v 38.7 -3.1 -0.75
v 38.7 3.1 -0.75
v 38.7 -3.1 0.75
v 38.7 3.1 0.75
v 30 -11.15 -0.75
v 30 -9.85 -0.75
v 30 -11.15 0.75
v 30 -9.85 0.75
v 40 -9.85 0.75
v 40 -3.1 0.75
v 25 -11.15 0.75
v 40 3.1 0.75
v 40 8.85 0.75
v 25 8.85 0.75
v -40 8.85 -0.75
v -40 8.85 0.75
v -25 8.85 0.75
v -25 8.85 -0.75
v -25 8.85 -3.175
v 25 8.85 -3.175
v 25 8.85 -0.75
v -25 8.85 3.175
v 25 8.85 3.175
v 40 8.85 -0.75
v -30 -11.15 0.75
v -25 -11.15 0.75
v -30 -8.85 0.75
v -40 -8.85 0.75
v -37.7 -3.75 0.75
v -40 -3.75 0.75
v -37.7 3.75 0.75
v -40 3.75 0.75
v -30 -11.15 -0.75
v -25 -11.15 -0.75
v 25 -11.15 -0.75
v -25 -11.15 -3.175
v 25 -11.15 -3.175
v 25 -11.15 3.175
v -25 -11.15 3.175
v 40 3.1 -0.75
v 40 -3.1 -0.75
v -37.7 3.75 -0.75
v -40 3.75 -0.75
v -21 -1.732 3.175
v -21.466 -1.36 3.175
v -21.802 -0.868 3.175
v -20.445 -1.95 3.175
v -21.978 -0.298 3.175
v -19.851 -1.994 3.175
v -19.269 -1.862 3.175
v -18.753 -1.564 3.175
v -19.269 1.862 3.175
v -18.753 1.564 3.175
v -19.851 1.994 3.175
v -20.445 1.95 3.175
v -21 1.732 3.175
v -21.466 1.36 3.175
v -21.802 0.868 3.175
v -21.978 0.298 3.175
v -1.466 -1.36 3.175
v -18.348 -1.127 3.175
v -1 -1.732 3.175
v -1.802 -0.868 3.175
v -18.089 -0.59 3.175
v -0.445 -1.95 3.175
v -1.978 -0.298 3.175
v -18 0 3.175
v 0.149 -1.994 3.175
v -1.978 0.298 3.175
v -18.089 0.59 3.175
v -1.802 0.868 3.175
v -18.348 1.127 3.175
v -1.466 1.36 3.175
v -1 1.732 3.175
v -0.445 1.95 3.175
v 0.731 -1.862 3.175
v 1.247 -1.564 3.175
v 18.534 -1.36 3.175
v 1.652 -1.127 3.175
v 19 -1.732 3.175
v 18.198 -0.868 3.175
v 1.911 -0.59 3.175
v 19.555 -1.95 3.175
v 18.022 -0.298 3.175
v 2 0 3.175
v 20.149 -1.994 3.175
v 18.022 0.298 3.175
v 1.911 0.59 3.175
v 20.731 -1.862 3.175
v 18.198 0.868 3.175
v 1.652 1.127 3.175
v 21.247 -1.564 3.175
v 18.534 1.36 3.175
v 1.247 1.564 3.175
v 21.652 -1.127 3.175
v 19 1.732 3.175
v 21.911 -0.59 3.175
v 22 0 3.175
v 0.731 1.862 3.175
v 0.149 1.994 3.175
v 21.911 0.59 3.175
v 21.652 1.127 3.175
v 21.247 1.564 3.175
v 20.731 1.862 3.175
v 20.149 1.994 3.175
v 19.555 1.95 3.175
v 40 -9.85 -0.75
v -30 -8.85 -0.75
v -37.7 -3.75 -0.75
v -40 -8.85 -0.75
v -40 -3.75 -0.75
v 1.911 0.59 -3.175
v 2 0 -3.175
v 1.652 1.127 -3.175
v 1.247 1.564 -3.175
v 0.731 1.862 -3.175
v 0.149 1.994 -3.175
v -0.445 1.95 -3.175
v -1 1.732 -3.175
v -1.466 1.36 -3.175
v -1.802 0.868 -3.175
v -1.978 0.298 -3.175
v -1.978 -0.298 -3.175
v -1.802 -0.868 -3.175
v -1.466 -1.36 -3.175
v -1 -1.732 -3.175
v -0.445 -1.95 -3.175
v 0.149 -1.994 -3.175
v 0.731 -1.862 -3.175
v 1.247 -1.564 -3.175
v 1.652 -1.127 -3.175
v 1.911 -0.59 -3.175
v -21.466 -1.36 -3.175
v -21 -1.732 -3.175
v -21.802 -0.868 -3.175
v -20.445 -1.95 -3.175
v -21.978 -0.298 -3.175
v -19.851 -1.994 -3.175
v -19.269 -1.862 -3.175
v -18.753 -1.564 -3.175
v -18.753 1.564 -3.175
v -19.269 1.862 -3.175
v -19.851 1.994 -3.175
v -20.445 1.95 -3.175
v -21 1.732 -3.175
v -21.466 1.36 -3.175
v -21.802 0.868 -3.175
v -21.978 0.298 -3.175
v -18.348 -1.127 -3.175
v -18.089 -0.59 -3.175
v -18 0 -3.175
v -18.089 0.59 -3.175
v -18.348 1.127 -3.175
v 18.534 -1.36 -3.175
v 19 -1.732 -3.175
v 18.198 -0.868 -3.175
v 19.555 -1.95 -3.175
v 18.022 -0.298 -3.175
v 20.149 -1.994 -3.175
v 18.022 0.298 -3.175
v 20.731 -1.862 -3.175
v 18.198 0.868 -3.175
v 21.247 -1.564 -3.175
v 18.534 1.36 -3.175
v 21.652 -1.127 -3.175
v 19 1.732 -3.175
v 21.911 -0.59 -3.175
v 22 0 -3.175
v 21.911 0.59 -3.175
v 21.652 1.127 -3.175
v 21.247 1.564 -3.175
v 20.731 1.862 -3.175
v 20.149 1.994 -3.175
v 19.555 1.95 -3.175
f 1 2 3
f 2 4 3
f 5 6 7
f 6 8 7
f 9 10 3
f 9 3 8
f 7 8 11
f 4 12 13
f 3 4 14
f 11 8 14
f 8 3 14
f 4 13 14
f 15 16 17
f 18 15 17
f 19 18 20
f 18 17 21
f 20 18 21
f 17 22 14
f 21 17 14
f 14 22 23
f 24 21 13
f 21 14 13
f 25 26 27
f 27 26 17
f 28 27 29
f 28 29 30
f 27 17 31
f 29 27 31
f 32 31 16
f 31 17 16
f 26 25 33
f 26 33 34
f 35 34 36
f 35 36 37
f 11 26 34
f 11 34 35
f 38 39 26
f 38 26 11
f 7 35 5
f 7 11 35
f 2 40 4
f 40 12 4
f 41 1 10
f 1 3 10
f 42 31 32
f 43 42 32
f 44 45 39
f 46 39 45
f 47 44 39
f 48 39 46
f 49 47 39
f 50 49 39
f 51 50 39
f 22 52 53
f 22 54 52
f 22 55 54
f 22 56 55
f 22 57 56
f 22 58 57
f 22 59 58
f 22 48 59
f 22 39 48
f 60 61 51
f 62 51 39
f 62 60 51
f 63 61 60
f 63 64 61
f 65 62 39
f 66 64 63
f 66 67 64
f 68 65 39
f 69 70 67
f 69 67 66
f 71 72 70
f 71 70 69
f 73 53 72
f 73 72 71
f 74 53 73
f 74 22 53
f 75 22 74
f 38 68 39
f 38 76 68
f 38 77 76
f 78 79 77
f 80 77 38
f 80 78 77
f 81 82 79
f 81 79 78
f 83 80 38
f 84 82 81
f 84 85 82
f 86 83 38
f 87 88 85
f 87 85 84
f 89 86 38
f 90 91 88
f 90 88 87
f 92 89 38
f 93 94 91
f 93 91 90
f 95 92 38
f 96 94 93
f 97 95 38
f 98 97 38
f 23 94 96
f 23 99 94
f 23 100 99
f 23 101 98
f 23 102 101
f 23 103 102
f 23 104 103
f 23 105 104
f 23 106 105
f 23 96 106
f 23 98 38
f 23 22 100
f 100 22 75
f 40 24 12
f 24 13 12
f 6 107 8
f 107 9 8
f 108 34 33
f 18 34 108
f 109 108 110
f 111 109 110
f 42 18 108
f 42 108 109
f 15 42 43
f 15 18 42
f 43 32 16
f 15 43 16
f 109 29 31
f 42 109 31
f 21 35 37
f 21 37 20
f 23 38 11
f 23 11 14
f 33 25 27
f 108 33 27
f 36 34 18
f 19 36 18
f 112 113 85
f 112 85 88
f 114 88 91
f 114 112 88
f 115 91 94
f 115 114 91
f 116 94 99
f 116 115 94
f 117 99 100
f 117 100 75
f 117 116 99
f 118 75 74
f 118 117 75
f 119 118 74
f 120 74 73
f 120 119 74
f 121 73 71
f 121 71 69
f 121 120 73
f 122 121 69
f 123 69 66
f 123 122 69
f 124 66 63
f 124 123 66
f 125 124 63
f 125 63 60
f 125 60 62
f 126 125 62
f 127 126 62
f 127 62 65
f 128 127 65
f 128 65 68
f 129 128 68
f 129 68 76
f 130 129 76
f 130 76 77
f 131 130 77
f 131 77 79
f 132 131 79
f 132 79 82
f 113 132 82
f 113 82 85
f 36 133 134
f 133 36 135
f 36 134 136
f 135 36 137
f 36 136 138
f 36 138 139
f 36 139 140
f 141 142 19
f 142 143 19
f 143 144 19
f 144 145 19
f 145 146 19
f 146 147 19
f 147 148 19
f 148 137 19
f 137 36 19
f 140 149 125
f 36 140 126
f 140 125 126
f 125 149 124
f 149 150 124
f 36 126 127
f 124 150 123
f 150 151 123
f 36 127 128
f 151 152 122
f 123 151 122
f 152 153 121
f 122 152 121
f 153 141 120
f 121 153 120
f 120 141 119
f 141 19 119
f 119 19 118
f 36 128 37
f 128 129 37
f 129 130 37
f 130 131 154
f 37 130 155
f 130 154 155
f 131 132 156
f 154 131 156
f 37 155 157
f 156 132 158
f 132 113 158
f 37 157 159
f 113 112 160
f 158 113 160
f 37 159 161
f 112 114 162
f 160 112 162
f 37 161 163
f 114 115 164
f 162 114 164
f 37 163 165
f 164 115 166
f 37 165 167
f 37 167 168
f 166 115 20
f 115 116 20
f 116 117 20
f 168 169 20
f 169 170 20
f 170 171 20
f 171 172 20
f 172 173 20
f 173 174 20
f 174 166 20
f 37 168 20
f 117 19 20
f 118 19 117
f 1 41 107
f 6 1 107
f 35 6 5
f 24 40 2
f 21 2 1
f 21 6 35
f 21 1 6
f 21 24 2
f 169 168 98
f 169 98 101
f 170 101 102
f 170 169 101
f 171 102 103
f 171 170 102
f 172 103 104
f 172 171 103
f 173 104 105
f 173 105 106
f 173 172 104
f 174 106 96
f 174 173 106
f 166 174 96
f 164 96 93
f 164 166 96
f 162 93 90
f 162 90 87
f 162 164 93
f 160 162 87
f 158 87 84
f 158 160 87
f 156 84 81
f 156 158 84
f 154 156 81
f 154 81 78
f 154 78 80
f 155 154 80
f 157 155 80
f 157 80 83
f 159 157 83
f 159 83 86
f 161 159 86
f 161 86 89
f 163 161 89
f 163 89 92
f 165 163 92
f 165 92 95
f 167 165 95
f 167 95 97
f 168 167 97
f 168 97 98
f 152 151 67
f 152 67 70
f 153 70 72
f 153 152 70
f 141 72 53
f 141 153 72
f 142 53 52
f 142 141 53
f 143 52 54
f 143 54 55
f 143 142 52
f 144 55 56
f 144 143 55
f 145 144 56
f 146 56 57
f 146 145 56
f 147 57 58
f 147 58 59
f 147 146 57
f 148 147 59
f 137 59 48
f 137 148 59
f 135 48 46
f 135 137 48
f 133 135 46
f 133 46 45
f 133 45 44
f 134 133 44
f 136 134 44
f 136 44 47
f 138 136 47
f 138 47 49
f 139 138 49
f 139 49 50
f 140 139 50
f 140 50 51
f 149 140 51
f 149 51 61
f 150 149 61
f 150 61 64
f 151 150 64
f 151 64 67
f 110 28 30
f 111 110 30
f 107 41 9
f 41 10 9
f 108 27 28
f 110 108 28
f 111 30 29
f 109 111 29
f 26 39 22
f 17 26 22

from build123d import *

# Parameters (mm, degrees)
CROQUIS1_R              = 2
SALIENTE_EXTRUIR1_DEPTH = 0.75
CROQUIS2_W              = 50
CROQUIS2_H              = 20
CROQUIS2_R              = 2
SALIENTE_EXTRUIR2_DEPTH = 3.175


with BuildPart() as part:
    # Croquis1 → Saliente-Extruir1 (new, symmetric)
    with BuildSketch(Plane.XY):
        Polygon((-40, 8.85), (40, 8.85), (40, 3.1), (38.7, 3.1), (38.7, -3.1), (40, -3.1), (40, -9.85), (30, -9.85), (30, -11.15), (-30, -11.15), (-30, -8.85), (-40, -8.85), (-40, -3.75), (-37.7, -3.75), (-37.7, 3.75), (-40, 3.75), align=None)
        with Locations((20, 0)):
            Circle(CROQUIS1_R, mode=Mode.SUBTRACT)
        Circle(CROQUIS1_R, mode=Mode.SUBTRACT)
        with Locations((-20, 0)):
            Circle(CROQUIS1_R, mode=Mode.SUBTRACT)
    extrude(amount=SALIENTE_EXTRUIR1_DEPTH, both=True)

    # Croquis2 → Saliente-Extruir2 (add, symmetric)
    with BuildSketch(Plane.XY):
        with Locations((0, -1.15)):
            Rectangle(CROQUIS2_W, CROQUIS2_H)
        with Locations((-20, 0)):
            Circle(CROQUIS2_R, mode=Mode.SUBTRACT)
        Circle(CROQUIS2_R, mode=Mode.SUBTRACT)
        with Locations((20, 0)):
            Circle(CROQUIS2_R, mode=Mode.SUBTRACT)
    extrude(amount=SALIENTE_EXTRUIR2_DEPTH, both=True)


solid = part.part
